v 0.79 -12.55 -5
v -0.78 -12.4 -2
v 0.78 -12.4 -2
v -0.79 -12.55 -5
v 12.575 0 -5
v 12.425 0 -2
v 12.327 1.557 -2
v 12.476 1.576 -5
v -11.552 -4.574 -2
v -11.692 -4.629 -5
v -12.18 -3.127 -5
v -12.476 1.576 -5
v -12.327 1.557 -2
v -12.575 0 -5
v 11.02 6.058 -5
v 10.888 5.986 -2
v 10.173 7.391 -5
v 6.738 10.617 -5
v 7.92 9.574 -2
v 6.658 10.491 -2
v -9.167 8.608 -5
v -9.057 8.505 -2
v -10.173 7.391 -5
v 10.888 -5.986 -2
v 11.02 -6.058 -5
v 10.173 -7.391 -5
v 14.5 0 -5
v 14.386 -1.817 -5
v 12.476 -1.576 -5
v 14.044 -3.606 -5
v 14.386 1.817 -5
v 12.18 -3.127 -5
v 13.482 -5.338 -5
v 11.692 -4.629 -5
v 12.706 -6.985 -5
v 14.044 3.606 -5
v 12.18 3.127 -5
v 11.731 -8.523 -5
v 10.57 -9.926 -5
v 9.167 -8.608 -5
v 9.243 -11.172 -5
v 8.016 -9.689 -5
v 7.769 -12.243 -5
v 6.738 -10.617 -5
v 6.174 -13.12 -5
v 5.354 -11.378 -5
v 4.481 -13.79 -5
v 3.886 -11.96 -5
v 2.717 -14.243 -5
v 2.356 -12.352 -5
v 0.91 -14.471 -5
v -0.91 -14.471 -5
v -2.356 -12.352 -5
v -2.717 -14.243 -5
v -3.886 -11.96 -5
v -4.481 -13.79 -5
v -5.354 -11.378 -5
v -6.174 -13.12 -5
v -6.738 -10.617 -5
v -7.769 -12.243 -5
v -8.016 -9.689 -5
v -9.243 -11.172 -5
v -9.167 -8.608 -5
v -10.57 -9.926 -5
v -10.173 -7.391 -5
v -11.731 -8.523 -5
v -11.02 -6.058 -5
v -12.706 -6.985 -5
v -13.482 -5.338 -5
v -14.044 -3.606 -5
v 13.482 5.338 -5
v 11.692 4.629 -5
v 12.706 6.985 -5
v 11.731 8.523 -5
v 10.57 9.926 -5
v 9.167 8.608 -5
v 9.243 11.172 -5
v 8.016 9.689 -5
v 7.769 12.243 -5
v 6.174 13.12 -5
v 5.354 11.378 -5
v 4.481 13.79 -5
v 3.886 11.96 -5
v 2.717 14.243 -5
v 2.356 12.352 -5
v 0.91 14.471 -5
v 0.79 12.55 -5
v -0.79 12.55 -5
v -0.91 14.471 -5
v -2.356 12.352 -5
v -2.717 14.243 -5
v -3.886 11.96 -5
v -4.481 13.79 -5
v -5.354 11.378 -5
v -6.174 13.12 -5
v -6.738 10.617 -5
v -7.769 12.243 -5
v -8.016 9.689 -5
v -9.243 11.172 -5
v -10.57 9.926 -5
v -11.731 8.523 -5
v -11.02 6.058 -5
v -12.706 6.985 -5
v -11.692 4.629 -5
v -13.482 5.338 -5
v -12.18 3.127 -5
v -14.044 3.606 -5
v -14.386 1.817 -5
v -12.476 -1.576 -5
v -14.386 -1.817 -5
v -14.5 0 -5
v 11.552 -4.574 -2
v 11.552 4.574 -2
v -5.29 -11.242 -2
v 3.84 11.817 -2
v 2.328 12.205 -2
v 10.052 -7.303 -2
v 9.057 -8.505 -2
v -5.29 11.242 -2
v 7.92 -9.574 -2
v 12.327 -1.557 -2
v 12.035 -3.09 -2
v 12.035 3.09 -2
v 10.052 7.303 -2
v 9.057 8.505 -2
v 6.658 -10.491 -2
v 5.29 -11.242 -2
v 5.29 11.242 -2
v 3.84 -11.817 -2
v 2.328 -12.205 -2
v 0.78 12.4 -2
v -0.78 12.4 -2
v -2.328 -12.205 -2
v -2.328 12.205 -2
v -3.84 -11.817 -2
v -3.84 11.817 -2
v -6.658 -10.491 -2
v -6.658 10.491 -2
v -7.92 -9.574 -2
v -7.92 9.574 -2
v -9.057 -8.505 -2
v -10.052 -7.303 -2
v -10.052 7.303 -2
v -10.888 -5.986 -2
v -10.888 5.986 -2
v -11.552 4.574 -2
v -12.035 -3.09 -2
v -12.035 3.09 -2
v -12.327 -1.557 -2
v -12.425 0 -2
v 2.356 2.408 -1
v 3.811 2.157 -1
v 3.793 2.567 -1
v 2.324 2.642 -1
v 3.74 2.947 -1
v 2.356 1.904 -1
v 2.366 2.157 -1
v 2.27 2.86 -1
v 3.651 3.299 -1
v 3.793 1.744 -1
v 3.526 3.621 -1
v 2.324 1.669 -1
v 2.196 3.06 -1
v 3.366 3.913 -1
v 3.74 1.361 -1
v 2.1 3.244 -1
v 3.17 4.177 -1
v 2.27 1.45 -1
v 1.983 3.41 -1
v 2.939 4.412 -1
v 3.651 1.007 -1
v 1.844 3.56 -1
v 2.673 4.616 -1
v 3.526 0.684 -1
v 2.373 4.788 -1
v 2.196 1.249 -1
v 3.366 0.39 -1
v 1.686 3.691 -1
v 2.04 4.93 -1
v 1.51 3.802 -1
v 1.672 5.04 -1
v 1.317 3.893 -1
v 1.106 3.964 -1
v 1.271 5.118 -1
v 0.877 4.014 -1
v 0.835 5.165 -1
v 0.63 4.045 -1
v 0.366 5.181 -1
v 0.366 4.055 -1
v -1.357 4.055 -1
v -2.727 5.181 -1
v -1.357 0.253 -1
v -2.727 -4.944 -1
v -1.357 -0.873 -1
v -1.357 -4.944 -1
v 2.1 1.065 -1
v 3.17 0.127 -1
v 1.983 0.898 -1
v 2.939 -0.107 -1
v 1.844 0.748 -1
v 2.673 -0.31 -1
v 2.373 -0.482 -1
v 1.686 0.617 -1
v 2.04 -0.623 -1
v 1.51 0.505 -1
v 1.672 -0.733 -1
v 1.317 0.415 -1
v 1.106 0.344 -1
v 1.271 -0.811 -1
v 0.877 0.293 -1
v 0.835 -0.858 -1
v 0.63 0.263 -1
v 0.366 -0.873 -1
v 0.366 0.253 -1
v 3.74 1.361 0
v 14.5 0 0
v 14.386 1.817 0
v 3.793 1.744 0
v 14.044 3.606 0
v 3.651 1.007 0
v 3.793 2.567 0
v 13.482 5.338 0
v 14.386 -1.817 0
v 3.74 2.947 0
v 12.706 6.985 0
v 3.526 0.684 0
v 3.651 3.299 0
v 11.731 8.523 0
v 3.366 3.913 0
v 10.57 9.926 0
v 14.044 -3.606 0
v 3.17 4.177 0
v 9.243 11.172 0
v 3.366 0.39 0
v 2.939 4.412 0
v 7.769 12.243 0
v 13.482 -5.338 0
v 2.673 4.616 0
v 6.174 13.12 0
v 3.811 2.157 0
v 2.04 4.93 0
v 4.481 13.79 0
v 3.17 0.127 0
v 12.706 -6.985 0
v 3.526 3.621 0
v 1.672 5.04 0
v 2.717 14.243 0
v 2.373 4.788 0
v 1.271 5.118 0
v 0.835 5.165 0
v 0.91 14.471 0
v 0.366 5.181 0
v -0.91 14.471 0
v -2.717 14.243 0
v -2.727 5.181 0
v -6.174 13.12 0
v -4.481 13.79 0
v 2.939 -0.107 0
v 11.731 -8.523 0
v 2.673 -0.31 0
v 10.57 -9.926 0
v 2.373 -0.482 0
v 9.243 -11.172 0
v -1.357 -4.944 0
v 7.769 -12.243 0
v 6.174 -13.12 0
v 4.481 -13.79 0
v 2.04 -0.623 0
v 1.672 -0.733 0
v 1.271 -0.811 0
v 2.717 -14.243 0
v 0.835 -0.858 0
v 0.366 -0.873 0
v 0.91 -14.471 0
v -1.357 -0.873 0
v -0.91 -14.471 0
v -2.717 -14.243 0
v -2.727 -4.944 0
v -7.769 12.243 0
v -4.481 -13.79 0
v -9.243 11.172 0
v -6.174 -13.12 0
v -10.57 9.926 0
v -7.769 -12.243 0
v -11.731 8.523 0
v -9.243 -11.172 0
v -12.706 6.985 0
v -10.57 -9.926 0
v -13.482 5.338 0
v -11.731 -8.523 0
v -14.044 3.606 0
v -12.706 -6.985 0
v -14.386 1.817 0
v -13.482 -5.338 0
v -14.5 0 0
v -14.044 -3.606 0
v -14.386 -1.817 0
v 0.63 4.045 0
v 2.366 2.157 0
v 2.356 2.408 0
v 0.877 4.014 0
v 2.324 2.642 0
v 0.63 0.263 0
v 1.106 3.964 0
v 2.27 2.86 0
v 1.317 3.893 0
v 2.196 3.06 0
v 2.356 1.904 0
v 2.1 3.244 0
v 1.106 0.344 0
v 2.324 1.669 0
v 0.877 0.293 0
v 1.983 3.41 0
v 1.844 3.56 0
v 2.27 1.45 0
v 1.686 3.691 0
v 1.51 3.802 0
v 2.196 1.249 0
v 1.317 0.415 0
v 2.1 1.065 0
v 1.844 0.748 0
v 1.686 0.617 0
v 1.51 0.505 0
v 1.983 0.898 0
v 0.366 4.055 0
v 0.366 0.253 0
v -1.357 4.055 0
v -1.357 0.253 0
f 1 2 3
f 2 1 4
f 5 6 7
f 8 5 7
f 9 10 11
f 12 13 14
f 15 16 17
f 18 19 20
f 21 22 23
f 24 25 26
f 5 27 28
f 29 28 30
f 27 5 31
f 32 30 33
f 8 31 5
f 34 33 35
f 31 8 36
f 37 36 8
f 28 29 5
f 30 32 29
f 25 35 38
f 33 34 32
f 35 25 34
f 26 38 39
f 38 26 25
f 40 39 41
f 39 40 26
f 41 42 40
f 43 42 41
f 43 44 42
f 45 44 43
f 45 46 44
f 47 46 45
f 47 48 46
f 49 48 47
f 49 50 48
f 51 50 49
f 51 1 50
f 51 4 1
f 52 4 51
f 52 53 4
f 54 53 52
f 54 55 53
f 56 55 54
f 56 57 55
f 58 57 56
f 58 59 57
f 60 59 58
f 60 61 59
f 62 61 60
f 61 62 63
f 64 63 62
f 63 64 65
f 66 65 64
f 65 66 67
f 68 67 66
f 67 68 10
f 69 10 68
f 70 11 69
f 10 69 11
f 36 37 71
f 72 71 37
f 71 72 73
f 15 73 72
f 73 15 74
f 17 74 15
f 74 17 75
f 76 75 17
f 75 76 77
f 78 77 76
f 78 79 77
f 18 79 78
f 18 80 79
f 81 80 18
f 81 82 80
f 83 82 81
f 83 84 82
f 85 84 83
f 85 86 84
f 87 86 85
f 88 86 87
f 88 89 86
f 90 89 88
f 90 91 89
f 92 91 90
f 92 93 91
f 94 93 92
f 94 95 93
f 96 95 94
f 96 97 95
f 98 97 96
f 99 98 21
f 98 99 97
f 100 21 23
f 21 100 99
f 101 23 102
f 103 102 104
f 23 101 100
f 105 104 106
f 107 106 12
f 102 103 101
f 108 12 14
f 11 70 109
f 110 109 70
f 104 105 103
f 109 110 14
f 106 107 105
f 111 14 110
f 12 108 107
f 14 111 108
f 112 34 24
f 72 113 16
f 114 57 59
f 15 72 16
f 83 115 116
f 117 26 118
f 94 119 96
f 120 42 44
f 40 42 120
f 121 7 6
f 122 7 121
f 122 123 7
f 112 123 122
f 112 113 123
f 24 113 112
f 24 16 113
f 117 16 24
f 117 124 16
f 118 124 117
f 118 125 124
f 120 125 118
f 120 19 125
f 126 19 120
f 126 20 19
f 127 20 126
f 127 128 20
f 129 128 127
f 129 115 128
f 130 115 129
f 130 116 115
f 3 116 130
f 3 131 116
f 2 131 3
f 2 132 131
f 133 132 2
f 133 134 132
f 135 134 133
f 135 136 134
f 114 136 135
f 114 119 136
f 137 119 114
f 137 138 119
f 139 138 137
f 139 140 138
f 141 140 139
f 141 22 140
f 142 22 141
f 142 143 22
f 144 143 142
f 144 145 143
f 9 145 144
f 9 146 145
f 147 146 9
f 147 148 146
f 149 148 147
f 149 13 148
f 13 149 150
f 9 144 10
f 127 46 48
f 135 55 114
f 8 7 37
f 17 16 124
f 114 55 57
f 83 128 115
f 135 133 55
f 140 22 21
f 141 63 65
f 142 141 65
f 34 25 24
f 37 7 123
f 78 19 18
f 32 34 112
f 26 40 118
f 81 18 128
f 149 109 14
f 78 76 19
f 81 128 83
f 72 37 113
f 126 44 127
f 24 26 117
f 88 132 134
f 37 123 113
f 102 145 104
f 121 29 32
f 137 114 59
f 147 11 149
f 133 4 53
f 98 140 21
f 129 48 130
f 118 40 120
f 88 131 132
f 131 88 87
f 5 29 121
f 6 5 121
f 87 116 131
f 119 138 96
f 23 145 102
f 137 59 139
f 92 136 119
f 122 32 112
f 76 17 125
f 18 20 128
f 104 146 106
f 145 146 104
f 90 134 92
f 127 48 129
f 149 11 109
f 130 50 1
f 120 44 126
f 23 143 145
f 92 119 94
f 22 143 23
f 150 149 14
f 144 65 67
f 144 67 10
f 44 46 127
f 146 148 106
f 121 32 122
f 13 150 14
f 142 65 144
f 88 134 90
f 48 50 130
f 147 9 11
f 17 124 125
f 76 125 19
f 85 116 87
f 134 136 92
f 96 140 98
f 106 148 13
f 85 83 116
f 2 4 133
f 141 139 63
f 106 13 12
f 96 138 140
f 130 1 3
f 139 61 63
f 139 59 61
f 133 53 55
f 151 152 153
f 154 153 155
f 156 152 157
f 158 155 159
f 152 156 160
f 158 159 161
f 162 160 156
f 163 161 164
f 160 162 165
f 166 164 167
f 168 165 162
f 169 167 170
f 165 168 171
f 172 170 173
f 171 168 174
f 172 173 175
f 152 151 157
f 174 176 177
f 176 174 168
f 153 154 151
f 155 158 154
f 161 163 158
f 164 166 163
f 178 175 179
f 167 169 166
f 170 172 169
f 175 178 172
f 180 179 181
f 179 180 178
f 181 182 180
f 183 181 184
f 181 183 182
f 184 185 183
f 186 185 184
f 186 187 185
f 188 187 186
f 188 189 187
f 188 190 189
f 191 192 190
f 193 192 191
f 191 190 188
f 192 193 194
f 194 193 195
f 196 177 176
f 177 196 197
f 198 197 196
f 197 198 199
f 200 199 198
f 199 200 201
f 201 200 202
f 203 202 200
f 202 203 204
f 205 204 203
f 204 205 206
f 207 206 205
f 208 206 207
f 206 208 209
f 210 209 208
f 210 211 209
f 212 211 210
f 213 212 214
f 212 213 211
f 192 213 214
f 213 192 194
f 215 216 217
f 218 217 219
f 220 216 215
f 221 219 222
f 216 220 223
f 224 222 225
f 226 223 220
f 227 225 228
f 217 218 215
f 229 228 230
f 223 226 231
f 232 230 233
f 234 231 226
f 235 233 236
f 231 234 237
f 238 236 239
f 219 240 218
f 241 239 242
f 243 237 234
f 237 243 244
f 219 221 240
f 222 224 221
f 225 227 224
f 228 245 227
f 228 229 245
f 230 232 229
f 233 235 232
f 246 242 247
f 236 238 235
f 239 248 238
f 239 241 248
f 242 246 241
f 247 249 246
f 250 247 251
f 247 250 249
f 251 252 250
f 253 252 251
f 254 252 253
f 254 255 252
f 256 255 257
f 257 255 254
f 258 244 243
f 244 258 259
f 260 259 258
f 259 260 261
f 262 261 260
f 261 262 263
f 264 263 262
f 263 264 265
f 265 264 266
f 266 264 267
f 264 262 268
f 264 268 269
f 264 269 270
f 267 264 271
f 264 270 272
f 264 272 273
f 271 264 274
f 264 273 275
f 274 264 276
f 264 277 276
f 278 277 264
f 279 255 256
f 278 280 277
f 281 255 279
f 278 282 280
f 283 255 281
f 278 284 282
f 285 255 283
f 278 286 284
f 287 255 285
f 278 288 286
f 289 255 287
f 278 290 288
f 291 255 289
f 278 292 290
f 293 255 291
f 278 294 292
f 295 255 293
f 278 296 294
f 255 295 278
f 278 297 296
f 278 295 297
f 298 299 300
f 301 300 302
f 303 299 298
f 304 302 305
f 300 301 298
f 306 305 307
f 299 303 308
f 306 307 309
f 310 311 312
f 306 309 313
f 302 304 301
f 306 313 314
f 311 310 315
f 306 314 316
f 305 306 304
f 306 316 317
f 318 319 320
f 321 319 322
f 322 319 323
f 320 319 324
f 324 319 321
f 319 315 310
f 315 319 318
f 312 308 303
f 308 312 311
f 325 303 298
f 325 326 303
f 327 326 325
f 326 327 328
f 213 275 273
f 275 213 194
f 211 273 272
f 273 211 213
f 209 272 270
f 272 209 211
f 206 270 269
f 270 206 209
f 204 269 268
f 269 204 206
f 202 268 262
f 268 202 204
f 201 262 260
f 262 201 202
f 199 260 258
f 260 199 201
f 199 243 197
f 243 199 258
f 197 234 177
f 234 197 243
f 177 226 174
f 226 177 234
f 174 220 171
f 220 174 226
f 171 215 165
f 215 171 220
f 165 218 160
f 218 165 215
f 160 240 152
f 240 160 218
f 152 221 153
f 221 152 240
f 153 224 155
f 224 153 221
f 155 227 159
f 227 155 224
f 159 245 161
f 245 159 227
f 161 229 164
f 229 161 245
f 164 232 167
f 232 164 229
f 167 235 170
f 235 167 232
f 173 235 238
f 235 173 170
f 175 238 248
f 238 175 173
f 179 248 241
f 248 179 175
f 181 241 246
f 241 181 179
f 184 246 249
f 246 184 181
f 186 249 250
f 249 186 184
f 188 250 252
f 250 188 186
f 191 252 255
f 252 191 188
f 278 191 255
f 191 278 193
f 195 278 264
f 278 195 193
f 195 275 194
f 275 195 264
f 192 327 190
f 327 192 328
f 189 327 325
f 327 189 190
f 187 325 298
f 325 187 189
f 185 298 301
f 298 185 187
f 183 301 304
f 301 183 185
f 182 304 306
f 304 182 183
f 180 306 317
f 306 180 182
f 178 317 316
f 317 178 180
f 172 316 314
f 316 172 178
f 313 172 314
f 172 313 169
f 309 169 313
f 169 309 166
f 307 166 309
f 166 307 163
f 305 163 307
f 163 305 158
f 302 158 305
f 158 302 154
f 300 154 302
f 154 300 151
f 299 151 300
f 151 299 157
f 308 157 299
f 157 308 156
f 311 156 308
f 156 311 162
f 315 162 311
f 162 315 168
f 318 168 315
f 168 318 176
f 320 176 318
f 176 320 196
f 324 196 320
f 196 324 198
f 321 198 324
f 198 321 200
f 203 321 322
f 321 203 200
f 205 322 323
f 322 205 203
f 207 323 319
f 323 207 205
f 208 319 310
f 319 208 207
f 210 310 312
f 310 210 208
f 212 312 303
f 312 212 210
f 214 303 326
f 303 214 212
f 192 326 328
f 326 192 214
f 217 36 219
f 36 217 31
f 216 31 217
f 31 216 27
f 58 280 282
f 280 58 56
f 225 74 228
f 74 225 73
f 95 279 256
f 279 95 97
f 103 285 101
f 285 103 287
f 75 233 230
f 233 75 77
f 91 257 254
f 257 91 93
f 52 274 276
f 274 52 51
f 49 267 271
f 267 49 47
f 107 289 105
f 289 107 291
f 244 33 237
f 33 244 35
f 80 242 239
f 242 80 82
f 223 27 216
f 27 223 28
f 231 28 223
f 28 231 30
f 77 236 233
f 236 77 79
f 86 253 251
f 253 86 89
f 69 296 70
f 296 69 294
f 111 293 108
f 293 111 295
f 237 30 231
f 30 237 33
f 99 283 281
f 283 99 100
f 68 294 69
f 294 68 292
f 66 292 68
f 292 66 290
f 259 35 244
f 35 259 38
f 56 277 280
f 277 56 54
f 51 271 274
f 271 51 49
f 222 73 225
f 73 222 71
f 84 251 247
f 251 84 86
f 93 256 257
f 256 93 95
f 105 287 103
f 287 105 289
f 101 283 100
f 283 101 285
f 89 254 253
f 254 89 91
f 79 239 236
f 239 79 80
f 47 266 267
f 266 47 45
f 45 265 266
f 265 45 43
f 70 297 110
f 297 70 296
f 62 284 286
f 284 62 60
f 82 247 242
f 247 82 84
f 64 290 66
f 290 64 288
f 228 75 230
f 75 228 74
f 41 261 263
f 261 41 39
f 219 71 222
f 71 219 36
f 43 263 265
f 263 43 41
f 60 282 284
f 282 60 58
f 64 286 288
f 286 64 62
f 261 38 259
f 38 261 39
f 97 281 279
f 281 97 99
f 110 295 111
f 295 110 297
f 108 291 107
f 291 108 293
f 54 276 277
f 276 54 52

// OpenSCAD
$fn = 50;

difference() {
	union() {
		translate(v = [0, 0, -5.0]) {
			cylinder(h = 5, r = 14.5);
		}
	}
	union() {
		#translate(v = [0, 0, -5.0]) {
			cylinder(h = 3, r1 = 12.575, r2 = 12.425);
		}
		translate(v = [0, 0, -1]) {
			linear_extrude(height = 1) {
				text(font = "Impact", halign = "center", size = 10, text = "P", valign = "center");
			}
		}
	}
}
